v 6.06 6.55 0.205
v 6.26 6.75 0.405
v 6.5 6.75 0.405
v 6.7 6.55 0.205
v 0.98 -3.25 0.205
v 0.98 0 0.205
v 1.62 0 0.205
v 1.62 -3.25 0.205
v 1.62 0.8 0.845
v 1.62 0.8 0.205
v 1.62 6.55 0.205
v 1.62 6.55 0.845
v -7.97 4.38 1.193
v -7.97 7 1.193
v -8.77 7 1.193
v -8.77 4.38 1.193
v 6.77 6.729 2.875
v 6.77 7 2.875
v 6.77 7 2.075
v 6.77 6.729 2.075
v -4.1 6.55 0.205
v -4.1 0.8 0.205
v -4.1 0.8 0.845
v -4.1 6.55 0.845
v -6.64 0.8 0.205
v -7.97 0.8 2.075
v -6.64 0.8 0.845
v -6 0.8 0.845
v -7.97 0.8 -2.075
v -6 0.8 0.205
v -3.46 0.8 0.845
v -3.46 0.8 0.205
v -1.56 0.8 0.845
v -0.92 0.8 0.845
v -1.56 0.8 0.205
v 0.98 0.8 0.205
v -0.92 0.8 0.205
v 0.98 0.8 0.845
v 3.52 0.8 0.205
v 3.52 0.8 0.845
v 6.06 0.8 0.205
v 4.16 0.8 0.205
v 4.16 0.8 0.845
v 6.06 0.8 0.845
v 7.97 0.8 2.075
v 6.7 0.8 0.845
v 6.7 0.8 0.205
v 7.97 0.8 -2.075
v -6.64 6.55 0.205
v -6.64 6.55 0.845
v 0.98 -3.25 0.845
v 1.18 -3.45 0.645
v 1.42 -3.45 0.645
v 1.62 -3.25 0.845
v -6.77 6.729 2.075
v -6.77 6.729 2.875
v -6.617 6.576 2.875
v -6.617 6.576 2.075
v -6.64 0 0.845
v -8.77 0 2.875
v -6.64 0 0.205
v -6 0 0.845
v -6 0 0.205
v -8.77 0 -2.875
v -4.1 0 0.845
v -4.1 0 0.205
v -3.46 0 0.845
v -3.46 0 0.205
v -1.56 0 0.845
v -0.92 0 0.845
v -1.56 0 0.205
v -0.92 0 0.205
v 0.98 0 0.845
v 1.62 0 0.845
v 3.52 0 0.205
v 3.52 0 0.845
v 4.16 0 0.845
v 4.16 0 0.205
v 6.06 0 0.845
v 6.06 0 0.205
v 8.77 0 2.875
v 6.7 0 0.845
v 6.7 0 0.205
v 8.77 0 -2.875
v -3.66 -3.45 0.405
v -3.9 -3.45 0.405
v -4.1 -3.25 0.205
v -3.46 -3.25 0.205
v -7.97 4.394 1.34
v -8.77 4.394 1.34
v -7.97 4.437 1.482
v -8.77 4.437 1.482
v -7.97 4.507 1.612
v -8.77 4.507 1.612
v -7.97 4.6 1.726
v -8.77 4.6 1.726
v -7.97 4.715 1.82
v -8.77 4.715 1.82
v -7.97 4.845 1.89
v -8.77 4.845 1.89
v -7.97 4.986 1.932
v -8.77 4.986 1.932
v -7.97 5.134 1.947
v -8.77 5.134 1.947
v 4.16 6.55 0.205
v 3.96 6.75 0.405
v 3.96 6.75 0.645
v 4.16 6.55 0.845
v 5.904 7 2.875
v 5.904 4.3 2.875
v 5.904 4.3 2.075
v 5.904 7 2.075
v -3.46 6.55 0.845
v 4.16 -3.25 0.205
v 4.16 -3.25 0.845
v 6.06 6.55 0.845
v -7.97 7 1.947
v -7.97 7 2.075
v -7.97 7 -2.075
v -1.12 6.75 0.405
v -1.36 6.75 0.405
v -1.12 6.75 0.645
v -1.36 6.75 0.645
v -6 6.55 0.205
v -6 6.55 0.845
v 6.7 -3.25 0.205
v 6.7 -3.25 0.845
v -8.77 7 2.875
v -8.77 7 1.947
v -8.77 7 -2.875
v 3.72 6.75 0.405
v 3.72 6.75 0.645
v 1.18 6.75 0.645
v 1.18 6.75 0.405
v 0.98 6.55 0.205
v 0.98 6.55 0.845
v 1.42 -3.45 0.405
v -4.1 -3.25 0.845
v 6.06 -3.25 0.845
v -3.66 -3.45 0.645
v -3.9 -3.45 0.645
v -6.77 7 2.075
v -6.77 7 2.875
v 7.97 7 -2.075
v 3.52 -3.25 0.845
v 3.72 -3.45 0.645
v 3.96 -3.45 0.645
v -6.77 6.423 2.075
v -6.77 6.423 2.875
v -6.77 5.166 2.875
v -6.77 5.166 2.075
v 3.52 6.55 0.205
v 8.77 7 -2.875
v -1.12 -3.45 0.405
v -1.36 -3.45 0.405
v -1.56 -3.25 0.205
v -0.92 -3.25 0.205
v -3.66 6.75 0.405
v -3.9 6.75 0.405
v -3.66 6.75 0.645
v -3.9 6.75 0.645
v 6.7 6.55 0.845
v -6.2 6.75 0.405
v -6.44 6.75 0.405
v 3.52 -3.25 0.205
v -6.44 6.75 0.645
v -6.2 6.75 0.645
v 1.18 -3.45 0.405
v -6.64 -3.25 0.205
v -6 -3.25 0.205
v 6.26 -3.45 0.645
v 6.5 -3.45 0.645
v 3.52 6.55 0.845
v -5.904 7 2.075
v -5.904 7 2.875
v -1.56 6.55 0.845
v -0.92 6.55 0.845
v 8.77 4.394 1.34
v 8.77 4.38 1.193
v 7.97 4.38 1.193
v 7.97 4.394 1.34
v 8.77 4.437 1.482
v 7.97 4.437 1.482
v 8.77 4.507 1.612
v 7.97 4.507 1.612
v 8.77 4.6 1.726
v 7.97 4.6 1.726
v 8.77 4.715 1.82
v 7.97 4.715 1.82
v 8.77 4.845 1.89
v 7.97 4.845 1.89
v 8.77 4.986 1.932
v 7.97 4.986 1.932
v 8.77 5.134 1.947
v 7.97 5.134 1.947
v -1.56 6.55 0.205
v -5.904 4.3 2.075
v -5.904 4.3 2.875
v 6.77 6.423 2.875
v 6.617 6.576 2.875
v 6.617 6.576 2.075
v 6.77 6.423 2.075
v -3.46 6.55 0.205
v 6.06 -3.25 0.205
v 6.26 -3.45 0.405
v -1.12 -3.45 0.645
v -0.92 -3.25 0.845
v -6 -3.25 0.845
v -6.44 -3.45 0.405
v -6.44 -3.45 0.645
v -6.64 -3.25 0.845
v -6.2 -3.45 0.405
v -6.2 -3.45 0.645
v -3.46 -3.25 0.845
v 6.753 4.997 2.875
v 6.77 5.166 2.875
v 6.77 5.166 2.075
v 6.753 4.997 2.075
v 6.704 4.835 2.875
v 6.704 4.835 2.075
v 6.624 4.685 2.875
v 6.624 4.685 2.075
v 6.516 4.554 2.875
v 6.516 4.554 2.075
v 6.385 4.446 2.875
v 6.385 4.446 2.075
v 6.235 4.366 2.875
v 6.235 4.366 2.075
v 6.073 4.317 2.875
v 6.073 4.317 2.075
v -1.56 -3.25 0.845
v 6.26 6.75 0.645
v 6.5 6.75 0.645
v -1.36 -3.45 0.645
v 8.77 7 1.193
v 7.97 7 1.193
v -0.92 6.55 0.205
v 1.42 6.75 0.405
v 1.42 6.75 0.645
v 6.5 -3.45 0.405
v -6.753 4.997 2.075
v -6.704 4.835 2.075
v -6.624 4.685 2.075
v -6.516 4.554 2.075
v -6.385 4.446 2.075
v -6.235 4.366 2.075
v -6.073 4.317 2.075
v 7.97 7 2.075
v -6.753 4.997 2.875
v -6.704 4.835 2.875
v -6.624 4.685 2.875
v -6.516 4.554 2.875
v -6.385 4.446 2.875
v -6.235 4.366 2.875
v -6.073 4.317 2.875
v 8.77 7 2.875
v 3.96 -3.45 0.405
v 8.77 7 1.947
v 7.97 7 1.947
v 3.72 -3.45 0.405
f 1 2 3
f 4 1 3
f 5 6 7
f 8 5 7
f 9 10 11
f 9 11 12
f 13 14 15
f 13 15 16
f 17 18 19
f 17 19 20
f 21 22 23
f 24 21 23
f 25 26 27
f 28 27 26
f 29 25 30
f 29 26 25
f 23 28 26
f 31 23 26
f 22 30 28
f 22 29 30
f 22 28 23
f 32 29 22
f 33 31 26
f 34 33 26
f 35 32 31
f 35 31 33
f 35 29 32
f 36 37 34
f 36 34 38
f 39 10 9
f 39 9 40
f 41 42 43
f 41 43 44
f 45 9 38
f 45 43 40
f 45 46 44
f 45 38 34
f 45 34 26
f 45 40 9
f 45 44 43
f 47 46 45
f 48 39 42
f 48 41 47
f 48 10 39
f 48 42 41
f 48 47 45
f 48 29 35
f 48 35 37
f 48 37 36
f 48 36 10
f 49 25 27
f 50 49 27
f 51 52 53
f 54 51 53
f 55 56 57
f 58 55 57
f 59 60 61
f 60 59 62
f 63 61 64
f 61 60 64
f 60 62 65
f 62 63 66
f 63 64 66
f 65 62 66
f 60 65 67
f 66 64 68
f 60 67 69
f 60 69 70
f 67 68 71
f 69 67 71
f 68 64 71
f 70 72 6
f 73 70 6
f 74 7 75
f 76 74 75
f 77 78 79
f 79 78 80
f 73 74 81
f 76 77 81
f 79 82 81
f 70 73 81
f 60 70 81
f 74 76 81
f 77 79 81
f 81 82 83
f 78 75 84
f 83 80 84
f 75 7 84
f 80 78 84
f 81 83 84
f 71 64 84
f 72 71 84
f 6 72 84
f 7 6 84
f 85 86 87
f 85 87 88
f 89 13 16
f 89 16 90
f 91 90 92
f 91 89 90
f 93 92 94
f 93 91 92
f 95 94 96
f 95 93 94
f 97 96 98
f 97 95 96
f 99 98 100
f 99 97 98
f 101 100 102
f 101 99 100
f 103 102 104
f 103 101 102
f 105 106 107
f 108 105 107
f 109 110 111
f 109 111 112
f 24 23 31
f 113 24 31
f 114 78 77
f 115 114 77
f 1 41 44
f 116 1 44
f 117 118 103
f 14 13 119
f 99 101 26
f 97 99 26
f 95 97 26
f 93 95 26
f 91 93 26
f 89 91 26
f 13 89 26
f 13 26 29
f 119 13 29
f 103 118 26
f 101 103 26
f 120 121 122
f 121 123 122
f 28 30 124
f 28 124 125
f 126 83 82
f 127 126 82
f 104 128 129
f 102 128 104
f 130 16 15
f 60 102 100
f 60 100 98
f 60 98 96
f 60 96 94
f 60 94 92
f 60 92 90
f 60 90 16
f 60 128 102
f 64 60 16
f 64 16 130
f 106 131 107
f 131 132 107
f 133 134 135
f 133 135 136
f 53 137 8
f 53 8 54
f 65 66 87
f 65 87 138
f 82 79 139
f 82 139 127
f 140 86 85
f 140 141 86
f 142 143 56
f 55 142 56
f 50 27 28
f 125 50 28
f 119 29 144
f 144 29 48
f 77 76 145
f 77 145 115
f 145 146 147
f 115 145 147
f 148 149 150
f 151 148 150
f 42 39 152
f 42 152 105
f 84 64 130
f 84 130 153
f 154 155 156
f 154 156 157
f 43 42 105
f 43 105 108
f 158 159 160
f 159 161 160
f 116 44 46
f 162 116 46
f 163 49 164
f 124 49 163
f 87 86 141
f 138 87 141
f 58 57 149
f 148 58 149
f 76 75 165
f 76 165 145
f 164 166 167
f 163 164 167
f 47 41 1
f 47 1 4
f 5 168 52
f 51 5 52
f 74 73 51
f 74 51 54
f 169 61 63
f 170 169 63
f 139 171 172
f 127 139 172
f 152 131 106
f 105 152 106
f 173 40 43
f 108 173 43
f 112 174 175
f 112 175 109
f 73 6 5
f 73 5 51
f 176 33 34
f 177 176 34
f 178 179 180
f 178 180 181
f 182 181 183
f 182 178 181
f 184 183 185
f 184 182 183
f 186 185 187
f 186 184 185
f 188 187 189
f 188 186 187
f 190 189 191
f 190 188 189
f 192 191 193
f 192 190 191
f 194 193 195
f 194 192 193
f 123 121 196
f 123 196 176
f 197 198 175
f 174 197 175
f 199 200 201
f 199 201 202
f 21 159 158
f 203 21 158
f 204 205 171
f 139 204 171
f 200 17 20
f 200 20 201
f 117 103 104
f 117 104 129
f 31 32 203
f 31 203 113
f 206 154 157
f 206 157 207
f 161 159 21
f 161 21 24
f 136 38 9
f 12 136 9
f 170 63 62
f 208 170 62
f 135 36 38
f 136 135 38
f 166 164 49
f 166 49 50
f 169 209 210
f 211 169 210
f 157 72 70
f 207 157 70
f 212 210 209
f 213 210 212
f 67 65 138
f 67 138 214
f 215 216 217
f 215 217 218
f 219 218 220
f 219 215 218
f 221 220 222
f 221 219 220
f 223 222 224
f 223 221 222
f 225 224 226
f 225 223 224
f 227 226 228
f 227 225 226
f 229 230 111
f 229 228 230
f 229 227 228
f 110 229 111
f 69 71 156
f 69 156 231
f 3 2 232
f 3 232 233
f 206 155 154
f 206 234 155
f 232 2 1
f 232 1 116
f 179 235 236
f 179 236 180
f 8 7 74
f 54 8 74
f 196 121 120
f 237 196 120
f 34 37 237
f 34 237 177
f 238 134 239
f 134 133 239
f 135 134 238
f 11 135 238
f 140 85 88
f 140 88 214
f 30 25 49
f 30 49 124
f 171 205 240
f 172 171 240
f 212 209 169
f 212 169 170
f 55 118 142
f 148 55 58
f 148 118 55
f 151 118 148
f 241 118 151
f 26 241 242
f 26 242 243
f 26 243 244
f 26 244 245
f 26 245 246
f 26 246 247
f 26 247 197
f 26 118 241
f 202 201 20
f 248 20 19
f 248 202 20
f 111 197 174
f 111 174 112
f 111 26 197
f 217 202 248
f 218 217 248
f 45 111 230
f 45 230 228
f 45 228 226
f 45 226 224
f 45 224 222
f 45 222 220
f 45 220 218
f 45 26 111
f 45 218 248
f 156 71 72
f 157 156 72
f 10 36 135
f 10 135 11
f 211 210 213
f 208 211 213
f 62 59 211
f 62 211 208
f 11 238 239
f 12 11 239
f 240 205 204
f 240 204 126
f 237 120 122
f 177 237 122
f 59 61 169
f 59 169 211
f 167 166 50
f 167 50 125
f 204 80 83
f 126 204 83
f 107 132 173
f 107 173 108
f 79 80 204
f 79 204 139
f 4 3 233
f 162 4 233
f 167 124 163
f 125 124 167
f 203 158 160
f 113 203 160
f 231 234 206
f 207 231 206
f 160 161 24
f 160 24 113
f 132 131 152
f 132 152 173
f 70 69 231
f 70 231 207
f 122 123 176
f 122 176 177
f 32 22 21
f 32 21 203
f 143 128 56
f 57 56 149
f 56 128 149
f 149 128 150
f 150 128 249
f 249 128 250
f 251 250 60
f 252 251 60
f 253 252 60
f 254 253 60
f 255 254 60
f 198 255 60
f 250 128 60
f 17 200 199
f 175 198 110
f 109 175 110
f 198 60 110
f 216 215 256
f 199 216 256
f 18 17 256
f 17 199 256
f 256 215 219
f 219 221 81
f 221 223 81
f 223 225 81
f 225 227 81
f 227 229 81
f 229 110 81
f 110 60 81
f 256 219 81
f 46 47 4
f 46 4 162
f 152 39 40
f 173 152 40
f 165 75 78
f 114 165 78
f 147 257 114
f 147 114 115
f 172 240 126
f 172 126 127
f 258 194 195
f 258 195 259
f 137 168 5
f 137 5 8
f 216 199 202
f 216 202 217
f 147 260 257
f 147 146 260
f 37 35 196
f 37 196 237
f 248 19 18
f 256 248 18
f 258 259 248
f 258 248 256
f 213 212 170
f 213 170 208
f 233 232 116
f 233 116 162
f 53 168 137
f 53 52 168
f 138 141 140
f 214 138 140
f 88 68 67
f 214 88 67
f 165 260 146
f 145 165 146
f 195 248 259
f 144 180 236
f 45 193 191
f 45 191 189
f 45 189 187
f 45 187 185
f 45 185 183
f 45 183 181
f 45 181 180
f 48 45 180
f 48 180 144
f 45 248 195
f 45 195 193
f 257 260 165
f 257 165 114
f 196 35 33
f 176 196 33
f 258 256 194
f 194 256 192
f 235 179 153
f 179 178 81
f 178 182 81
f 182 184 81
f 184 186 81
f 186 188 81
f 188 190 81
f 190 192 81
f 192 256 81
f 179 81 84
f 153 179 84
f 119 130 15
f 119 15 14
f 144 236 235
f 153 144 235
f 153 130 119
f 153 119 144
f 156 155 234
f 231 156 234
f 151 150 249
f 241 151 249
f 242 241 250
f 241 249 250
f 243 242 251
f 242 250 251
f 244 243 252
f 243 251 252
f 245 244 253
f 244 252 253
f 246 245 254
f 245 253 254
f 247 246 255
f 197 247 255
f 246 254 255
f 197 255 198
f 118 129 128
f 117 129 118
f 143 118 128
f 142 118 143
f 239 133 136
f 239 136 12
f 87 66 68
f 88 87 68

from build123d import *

# Parameters (mm, degrees)
SKETCH1_W                = 17.54
SKETCH1_H                = 5.75
BOSS_EXTRUDE1_DEPTH      = 7
SHELL1_T                 = -0.8
CUT_EXTRUDE1_DEPTH       = 18.54
CUT_EXTRUDE2_REACH       = 7.75
SKETCH4_W                = 0.64
SKETCH4_H                = 0.64
BOSS_EXTRUDE2_DEPTH      = 3.45
BOSS_EXTRUDE2_DEPTH_BACK = 6.75
CHAMFER1_SIZE            = 0.2


with BuildPart() as part:
    # Sketch1 → Boss-Extrude1 (new body)
    with BuildSketch(Plane(origin=(0, 0, 0), x_dir=(1, 0, 0), z_dir=(0, 1, 0))):
        Rectangle(SKETCH1_W, SKETCH1_H)
    extrude(amount=BOSS_EXTRUDE1_DEPTH)

    # Shell1
    shell1_openings = [part.faces().sort_by_distance(p)[0] for p in [
        (0, 7, 0),
    ]]
    offset(amount=SHELL1_T, openings=shell1_openings, kind=Kind.INTERSECTION)

    # Sketch2 → Cut-Extrude1 (cut, through all)
    with BuildSketch(Plane(origin=(8.77, 0, 0), x_dir=(0, 0, -1), z_dir=(1, 0, 0))):
        with BuildLine():
            Line((-1.19301282, 7), (-1.19301282, 4.379603984))
            ThreePointArc((-1.19301282, 4.379603984), (-1.72610374, 4.600417472), (-1.946917229, 5.133508392))
            Line((-1.946917229, 5.133508392), (-1.946917229, 7))
            Line((-1.946917229, 7), (-1.19301282, 7))
        make_face()
    extrude(amount=-CUT_EXTRUDE1_DEPTH, mode=Mode.SUBTRACT)

    # Sketch3 → Cut-Extrude2 (cut, up to next)
    with BuildSketch(Plane.XY.offset(2.875), mode=Mode.PRIVATE) as cut_extrude2_sk1:
        with BuildLine():
            Line((-6.77, 7), (-6.77, 6.728922615))
            Line((-6.77, 6.728922615), (-6.617135549, 6.576058164))
            Line((-6.617135549, 6.576058164), (-6.77, 6.423193713))
            Line((-6.77, 6.423193713), (-6.77, 5.166308225))
            ThreePointArc((-6.77, 5.166308225), (-6.516286554, 4.553789782), (-5.90376811, 4.300076336))
            Line((-5.90376811, 4.300076336), (-5.90376811, 7))
            Line((-5.90376811, 7), (-6.77, 7))
        make_face()
    cut_extrude2_tool1 = extrude(cut_extrude2_sk1.sketch, amount=-CUT_EXTRUDE2_REACH, mode=Mode.PRIVATE) & part.part
    add(cut_extrude2_tool1.solids().sort_by_distance((-6.314828, 5.726435, 2.875))[0], mode=Mode.SUBTRACT)
    # Sketch3 → Cut-Extrude2 (cut, up to next)
    with BuildSketch(Plane.XY.offset(2.875), mode=Mode.PRIVATE) as cut_extrude2_sk2:
        with BuildLine():
            Line((5.90376811, 7), (6.77, 7))
            Line((6.77, 7), (6.77, 6.728922615))
            Line((6.77, 6.728922615), (6.617135549, 6.576058164))
            Line((6.617135549, 6.576058164), (6.77, 6.423193713))
            Line((6.77, 6.423193713), (6.77, 5.166308225))
            ThreePointArc((6.77, 5.166308225), (6.516286554, 4.553789782), (5.90376811, 4.300076336))
            Line((5.90376811, 4.300076336), (5.90376811, 7))
        make_face()
    cut_extrude2_tool2 = extrude(cut_extrude2_sk2.sketch, amount=-CUT_EXTRUDE2_REACH, mode=Mode.PRIVATE) & part.part
    add(cut_extrude2_tool2.solids().sort_by_distance((6.314828, 5.726435, 2.875))[0], mode=Mode.SUBTRACT)

    # Sketch4 → Boss-Extrude2 (add, two sides)
    with BuildSketch(Plane.XZ) as boss_extrude2_sk:
        with Locations((-6.32, 0.525)):
            Rectangle(SKETCH4_W, SKETCH4_H)
        with Locations((-3.78, 0.525)):
            Rectangle(SKETCH4_W, SKETCH4_H)
        with Locations((-1.24, 0.525)):
            Rectangle(SKETCH4_W, SKETCH4_H)
        with Locations((1.3, 0.525)):
            Rectangle(SKETCH4_W, SKETCH4_H)
        with Locations((3.84, 0.525)):
            Rectangle(SKETCH4_W, SKETCH4_H)
        with Locations((6.38, 0.525)):
            Rectangle(SKETCH4_W, SKETCH4_H)
    extrude(amount=BOSS_EXTRUDE2_DEPTH)
    extrude(boss_extrude2_sk.sketch, amount=-BOSS_EXTRUDE2_DEPTH_BACK)

    # Chamfer1
    chamfer1_edges = [part.edges().sort_by_distance(p)[0] for p in [
        (-6, 6.75, 0.525),
        (-6.32, 6.75, 0.205),
        (-6.64, 6.75, 0.525),
        (-6.32, 6.75, 0.845),
        (-6, -3.45, 0.525),
        (-6.32, -3.45, 0.845),
        (-6.64, -3.45, 0.525),
        (-6.32, -3.45, 0.205),
        (-3.78, 6.75, 0.205),
        (-4.1, 6.75, 0.525),
        (-3.78, 6.75, 0.845),
        (-3.46, 6.75, 0.525),
        (-3.78, -3.45, 0.205),
        (-3.46, -3.45, 0.525),
        (-3.78, -3.45, 0.845),
        (-4.1, -3.45, 0.525),
        (-1.24, 6.75, 0.205),
        (-1.56, 6.75, 0.525),
        (-1.24, 6.75, 0.845),
        (-0.92, 6.75, 0.525),
        (-1.24, -3.45, 0.205),
        (-0.92, -3.45, 0.525),
        (-1.24, -3.45, 0.845),
        (-1.56, -3.45, 0.525),
        (1.3, 6.75, 0.205),
        (0.98, 6.75, 0.525),
        (1.3, 6.75, 0.845),
        (1.62, 6.75, 0.525),
        (1.3, -3.45, 0.205),
        (1.62, -3.45, 0.525),
        (1.3, -3.45, 0.845),
        (0.98, -3.45, 0.525),
        (3.84, 6.75, 0.205),
        (3.52, 6.75, 0.525),
        (3.84, 6.75, 0.845),
        (4.16, 6.75, 0.525),
        (3.84, -3.45, 0.205),
        (4.16, -3.45, 0.525),
        (3.84, -3.45, 0.845),
        (3.52, -3.45, 0.525),
        (6.38, 6.75, 0.205),
        (6.06, 6.75, 0.525),
        (6.38, 6.75, 0.845),
        (6.7, 6.75, 0.525),
        (6.38, -3.45, 0.205),
        (6.7, -3.45, 0.525),
        (6.38, -3.45, 0.845),
        (6.06, -3.45, 0.525),
    ]]
    chamfer(chamfer1_edges, length=CHAMFER1_SIZE)


solid = part.part
